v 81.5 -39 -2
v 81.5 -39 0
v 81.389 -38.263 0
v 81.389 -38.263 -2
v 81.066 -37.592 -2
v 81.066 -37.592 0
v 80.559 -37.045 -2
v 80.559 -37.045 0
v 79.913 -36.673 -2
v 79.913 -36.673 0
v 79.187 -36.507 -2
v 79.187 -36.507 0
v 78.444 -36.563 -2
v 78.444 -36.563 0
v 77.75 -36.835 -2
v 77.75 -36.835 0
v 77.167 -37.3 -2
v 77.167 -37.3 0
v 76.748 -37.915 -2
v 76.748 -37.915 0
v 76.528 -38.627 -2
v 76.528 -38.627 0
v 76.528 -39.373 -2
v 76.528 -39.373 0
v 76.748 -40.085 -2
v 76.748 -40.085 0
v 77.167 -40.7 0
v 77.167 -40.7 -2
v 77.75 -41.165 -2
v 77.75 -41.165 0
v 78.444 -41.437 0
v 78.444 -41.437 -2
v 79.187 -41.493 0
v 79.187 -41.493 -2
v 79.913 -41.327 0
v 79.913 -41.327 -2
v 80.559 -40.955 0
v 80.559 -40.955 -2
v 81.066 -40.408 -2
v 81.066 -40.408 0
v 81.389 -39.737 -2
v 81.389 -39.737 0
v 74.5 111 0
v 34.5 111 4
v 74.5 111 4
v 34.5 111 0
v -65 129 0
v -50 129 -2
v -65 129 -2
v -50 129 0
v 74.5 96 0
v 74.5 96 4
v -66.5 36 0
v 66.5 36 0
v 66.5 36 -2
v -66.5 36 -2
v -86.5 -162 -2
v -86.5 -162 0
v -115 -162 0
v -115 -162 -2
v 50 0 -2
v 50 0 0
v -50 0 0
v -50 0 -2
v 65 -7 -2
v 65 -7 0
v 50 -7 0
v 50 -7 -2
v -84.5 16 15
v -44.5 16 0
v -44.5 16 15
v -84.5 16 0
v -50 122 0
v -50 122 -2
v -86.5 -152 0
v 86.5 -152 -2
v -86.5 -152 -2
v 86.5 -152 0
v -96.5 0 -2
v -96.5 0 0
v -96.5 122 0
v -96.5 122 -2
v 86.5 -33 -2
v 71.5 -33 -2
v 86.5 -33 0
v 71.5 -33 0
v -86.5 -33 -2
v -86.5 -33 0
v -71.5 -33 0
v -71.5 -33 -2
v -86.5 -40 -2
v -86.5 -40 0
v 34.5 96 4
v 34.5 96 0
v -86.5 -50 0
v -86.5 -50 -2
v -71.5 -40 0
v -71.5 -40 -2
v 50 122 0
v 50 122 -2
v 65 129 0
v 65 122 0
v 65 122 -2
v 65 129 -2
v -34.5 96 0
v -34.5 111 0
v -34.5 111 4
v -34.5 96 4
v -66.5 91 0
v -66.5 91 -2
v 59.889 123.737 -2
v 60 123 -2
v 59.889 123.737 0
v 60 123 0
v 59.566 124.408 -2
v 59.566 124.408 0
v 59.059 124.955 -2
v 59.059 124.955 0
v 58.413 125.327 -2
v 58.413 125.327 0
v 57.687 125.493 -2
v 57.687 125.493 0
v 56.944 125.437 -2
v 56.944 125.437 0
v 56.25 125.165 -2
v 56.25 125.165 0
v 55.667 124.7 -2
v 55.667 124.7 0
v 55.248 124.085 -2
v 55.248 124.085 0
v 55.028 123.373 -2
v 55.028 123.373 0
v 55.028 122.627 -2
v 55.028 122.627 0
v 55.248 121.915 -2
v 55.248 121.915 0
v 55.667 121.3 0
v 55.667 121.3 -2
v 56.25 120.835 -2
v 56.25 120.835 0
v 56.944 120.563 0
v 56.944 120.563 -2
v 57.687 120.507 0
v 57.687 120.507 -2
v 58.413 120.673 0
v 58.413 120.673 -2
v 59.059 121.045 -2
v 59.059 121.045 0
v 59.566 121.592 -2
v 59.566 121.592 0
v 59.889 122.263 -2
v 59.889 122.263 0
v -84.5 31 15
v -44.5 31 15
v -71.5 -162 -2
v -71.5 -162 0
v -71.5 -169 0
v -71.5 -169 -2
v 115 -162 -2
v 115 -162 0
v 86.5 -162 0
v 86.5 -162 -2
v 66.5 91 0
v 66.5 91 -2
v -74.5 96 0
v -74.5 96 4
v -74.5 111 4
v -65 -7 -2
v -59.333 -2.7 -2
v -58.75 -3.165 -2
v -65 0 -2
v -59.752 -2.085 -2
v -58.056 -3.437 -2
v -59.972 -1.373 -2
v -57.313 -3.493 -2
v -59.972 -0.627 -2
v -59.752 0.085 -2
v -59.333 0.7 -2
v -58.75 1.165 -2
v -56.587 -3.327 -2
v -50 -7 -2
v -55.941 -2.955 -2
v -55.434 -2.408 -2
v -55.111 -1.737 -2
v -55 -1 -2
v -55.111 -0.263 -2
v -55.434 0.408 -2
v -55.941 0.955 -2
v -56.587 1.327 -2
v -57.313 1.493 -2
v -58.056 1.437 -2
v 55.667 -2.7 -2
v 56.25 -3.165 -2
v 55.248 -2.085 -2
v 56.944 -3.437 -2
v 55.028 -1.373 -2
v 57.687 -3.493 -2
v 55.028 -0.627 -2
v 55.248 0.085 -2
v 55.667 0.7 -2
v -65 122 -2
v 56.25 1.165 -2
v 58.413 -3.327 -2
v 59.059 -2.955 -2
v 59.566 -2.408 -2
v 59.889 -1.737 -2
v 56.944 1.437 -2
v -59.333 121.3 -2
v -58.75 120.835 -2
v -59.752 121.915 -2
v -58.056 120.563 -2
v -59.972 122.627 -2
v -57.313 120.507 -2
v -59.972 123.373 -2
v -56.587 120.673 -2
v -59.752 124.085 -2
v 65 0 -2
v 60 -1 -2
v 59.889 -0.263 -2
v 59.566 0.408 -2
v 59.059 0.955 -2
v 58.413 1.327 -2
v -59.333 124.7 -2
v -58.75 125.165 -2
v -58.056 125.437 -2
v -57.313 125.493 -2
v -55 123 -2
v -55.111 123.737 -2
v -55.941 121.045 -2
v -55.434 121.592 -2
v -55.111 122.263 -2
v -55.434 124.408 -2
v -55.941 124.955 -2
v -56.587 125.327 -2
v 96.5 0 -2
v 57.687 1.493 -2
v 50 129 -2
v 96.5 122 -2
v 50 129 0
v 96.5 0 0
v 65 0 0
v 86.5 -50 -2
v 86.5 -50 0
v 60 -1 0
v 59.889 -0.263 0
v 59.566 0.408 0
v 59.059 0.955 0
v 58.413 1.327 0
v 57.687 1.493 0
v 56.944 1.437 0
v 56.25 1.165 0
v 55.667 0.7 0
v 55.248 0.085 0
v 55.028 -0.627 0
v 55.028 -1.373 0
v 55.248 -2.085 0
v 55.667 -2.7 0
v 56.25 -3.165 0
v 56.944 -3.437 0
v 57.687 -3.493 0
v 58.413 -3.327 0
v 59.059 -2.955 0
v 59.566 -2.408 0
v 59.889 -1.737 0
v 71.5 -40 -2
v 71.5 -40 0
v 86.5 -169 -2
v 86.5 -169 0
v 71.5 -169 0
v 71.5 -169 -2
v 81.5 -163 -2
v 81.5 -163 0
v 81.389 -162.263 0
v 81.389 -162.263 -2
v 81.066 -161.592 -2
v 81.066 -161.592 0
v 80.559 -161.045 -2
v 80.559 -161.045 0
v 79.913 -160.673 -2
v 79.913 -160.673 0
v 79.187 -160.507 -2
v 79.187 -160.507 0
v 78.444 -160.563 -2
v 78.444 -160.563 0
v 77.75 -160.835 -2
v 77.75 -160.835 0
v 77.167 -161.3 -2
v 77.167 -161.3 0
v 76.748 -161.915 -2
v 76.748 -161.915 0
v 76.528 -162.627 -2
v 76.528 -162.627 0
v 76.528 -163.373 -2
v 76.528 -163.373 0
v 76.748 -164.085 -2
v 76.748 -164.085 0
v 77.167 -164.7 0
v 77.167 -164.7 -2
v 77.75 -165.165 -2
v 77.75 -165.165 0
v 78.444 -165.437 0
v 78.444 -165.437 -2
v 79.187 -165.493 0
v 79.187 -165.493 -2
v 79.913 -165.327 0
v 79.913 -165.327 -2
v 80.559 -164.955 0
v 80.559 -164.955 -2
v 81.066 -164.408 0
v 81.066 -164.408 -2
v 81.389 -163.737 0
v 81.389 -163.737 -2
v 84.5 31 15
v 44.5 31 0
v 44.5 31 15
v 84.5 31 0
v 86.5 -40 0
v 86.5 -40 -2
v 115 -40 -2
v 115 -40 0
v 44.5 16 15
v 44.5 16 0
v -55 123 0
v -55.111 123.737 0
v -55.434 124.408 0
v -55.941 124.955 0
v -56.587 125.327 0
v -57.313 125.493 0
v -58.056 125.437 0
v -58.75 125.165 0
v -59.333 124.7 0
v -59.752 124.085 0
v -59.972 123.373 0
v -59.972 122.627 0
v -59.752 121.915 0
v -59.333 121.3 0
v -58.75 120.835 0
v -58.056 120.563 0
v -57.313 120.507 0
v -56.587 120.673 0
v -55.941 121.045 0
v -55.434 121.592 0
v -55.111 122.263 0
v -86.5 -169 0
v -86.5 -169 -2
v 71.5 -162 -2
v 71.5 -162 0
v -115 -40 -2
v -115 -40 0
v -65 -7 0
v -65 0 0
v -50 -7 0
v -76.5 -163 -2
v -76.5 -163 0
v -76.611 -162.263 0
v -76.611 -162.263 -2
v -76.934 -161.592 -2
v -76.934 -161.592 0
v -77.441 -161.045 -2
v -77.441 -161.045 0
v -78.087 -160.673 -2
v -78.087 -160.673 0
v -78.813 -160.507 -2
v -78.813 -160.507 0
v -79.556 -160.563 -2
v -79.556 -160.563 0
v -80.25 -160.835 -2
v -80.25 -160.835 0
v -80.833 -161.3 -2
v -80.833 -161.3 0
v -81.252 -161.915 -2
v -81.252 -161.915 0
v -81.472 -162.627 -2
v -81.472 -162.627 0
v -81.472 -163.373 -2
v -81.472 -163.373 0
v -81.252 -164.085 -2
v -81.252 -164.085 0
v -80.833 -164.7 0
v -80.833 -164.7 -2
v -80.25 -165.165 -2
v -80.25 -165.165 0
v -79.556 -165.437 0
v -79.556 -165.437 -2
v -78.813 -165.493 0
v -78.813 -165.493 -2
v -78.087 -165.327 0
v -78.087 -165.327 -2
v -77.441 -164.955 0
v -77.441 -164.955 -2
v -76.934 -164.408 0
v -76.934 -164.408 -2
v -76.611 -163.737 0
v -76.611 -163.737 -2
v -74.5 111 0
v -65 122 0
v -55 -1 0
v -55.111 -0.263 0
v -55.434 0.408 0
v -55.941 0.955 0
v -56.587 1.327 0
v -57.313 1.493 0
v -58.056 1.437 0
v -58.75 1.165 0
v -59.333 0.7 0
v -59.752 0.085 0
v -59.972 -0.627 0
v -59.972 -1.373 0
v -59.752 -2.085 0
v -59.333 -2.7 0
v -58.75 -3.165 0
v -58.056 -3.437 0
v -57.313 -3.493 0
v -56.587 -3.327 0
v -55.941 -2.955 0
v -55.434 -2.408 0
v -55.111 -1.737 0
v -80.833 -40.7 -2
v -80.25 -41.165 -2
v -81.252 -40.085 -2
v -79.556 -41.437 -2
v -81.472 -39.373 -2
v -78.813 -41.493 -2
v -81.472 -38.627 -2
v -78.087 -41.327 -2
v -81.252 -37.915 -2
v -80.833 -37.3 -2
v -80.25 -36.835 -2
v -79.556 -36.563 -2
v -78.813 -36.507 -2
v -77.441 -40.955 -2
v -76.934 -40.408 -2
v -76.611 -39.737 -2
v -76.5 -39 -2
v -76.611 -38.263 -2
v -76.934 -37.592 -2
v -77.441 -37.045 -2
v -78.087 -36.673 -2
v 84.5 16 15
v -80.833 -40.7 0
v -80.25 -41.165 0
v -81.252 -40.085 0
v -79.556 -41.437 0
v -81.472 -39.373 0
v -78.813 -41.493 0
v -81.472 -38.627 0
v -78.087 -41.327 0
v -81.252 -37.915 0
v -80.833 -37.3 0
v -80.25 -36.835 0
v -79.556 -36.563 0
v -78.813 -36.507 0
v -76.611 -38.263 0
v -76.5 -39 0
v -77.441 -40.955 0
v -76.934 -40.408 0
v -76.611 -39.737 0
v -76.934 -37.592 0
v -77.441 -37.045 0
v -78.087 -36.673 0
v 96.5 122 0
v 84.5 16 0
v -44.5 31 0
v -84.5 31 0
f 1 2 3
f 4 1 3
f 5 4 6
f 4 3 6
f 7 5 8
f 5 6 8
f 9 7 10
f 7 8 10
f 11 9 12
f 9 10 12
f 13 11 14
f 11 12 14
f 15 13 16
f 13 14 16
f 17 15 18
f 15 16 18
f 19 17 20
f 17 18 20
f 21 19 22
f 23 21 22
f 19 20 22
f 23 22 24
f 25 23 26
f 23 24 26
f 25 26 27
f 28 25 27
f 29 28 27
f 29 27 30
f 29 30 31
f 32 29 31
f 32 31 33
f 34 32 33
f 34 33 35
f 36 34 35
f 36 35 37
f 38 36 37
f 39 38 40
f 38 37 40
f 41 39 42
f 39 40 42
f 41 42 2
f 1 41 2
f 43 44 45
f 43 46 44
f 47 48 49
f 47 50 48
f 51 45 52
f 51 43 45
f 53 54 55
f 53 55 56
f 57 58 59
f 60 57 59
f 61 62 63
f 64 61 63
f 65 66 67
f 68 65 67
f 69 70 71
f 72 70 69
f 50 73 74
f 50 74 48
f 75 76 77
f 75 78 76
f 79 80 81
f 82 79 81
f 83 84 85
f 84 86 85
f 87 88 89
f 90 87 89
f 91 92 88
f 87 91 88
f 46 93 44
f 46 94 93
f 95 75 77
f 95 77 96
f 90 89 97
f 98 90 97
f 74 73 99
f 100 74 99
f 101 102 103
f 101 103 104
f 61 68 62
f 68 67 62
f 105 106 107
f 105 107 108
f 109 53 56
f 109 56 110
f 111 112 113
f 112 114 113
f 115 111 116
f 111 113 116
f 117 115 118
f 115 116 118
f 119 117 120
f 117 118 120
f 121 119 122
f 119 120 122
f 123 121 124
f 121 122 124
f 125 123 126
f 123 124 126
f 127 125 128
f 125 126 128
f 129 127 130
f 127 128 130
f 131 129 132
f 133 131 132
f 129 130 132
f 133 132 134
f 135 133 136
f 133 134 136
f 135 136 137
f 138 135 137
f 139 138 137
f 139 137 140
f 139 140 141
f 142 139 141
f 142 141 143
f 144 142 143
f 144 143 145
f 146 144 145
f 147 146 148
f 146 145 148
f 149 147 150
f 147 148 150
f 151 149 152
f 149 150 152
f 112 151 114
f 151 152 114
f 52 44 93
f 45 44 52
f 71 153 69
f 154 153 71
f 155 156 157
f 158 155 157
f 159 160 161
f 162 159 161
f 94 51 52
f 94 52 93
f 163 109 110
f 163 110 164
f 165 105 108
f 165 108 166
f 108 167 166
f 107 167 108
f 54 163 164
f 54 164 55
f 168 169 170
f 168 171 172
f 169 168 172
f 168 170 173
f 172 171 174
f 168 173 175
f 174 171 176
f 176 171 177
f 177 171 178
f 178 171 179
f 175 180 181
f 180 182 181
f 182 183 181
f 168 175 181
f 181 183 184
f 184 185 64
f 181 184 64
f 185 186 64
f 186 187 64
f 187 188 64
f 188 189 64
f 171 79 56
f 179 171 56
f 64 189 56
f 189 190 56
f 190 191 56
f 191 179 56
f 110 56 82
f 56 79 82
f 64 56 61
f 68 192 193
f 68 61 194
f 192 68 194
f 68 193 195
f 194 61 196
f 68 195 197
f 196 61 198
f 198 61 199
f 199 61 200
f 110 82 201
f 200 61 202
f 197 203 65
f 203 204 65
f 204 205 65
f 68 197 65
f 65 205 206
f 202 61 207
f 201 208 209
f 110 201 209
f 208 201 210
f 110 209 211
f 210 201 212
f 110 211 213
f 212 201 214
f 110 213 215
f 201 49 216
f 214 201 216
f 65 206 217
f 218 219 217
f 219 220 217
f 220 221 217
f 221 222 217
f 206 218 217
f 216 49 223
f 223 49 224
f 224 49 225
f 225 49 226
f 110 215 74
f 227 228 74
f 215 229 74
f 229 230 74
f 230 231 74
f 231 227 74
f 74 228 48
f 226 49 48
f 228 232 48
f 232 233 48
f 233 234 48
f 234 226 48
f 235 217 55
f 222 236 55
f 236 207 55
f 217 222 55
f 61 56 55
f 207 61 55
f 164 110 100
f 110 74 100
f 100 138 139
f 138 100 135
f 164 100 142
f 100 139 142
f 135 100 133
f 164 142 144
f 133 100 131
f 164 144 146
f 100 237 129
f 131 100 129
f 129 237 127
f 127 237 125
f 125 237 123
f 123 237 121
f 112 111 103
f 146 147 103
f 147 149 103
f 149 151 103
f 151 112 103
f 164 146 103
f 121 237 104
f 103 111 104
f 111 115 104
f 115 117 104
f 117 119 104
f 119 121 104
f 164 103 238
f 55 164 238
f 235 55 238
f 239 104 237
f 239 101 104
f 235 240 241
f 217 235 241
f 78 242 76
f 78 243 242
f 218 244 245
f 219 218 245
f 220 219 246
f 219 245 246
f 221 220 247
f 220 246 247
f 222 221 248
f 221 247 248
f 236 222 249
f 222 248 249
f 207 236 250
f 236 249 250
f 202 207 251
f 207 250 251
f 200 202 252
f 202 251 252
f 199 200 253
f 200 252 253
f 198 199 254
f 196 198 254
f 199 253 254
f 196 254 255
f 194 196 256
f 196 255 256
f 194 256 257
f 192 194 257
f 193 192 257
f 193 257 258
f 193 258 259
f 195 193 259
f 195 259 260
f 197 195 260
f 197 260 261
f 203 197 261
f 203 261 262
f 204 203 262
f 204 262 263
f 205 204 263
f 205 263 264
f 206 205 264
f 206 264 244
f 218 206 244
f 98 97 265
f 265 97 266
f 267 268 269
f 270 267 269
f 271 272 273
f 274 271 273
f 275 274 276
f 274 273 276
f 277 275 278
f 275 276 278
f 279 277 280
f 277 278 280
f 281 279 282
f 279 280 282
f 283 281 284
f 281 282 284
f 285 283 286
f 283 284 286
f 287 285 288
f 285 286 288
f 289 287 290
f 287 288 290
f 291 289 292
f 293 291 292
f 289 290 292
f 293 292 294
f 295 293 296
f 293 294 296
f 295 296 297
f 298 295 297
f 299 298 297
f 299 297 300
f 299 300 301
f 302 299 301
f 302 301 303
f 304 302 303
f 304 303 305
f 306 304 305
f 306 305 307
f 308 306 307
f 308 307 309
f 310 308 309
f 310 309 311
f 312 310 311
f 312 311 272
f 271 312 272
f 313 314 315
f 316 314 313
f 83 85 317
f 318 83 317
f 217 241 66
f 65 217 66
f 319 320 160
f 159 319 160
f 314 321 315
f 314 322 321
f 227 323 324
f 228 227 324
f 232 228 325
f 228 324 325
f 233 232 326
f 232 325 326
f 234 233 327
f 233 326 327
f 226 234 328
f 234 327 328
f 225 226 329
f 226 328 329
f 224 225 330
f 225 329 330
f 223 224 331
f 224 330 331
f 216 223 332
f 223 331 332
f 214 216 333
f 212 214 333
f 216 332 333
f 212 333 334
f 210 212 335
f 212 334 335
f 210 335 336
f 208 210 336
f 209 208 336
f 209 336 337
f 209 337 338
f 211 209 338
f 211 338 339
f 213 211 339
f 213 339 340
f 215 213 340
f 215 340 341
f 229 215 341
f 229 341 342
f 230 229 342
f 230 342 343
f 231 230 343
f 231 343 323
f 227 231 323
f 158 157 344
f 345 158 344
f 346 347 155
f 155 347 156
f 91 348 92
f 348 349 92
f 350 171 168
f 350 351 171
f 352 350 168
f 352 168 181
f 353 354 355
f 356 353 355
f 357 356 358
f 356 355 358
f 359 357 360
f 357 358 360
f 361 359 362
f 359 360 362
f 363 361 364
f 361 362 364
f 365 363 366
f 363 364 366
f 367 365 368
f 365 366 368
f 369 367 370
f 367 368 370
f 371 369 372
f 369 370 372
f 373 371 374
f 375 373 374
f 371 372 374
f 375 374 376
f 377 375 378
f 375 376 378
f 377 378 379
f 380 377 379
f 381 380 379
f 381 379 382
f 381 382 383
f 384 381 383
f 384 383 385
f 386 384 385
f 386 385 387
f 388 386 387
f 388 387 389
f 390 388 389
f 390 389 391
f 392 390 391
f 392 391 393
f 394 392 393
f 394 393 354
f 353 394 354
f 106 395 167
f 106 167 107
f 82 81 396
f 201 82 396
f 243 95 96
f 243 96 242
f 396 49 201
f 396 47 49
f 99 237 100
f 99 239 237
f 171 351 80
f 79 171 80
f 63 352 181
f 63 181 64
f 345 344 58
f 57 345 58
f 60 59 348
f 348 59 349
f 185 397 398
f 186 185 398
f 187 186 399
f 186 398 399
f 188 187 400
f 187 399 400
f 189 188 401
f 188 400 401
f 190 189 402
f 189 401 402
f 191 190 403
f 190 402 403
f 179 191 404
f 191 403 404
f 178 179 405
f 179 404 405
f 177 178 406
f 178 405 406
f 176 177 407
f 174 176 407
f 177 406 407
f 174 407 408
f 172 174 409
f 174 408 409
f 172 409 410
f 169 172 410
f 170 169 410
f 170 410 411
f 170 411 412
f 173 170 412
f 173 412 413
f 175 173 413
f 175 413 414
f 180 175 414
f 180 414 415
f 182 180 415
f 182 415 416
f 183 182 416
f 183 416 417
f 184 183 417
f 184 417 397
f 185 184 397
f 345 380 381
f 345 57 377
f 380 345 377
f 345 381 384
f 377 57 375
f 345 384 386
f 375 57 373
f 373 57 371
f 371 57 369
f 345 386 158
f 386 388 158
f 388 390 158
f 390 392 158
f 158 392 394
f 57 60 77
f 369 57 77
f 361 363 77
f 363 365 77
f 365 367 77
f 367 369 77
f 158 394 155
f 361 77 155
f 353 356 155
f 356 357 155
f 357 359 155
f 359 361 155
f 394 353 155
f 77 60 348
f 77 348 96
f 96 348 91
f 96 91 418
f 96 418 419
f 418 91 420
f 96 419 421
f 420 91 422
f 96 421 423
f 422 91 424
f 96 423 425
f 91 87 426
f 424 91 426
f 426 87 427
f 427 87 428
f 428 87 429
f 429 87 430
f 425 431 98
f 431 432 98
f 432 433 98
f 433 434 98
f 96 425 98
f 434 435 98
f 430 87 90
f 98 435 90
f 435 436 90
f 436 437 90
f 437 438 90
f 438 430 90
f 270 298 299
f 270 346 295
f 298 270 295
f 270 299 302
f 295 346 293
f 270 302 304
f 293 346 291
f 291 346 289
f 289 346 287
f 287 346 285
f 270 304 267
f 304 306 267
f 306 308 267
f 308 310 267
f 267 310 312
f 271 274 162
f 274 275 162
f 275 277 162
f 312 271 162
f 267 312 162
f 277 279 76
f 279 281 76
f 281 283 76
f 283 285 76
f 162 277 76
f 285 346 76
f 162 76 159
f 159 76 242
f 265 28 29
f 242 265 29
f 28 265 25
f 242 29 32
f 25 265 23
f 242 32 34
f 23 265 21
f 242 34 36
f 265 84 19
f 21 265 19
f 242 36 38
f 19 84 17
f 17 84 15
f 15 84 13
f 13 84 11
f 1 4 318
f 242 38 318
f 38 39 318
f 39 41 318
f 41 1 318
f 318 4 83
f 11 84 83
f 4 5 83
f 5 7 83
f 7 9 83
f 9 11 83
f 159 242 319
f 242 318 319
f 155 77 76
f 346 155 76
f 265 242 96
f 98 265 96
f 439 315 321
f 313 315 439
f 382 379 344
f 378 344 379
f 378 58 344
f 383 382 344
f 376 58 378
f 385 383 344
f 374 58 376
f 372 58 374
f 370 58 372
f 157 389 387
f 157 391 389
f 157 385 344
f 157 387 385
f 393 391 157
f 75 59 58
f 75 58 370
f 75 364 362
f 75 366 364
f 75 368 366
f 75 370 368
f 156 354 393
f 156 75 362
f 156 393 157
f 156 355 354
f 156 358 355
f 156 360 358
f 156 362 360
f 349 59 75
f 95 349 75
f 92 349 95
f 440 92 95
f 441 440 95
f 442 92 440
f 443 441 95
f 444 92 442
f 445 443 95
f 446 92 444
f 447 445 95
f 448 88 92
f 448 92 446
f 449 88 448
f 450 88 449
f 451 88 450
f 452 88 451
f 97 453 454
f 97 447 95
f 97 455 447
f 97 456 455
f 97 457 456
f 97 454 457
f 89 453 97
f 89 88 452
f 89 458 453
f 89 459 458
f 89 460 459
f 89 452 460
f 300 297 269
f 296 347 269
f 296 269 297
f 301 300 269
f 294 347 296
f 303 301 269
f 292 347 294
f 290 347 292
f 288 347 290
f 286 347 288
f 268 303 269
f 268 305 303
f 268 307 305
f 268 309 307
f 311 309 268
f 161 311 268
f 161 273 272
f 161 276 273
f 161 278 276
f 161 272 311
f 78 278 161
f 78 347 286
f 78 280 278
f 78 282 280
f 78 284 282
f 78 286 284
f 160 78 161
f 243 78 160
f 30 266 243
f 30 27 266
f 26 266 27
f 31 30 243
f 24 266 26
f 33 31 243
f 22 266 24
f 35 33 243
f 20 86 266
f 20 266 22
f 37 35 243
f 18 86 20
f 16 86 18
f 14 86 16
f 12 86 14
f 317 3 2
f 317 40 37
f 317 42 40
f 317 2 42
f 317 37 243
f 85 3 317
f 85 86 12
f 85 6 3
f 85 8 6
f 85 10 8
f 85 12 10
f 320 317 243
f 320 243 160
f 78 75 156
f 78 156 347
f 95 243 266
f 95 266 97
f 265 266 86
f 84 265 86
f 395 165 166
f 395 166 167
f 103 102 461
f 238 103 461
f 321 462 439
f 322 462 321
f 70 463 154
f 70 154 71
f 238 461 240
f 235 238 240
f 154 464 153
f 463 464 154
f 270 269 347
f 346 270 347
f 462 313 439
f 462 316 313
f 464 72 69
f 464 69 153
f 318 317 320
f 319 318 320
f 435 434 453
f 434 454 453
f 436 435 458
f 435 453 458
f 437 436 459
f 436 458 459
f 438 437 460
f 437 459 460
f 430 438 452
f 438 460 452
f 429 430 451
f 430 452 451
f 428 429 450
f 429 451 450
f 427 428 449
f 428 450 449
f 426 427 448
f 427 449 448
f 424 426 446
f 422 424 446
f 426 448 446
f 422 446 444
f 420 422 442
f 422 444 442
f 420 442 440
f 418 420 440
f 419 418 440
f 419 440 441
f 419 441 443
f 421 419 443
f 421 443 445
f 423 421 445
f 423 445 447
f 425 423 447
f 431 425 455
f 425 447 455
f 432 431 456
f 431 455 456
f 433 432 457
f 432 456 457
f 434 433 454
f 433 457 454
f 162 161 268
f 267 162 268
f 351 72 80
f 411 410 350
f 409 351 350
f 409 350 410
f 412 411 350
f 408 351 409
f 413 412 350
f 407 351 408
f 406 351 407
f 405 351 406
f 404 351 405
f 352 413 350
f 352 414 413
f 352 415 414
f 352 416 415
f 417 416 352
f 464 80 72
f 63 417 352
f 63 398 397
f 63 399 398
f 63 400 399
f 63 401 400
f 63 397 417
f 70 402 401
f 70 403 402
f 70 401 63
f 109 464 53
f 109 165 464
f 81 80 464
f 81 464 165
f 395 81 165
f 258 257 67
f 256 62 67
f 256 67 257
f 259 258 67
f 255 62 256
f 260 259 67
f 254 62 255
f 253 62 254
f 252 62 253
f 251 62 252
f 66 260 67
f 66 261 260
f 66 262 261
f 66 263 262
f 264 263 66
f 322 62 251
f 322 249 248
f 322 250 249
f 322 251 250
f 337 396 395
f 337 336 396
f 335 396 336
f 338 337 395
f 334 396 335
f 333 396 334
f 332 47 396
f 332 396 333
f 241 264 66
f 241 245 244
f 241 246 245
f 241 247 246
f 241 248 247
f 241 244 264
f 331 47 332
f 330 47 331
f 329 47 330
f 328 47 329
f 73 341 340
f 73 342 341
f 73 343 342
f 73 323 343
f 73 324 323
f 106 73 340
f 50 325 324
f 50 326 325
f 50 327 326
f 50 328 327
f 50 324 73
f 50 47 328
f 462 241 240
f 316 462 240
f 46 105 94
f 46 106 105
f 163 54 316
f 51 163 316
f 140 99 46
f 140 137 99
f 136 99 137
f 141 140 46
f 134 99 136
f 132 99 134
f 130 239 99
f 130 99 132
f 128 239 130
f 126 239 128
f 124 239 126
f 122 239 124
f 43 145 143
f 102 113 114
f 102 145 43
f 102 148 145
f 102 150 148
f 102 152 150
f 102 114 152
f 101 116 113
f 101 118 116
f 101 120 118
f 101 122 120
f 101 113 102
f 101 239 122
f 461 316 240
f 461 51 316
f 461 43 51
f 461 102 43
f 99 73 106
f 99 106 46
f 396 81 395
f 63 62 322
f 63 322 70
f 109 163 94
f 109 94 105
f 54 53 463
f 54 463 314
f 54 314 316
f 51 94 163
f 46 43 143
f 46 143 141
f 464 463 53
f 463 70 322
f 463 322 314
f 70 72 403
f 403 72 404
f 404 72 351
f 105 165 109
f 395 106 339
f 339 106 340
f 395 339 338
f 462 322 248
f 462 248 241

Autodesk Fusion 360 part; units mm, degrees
sketch "Sketch1" plane through (0, 0, 0) normal (0, 0, 1) x (1, 0, 0) in component "SD XL Back"
  line L0 (0, 0) -> (0, 5) construction
  line L1 (-91.5, 117) -> (91.5, 117)
  line L2 (91.5, 117) -> (91.5, 5)
  line L3 (91.5, 5) -> (-91.5, 5)
  line L4 (-91.5, 5) -> (-91.5, 117)
  line L5 (-74.5, 111) -> (-34.5, 111)
  line L6 (-34.5, 111) -> (-34.5, 96)
  line L7 (-34.5, 96) -> (-74.5, 96)
  line L8 (-74.5, 96) -> (-74.5, 111)
  line L9 (34.5, 111) -> (74.5, 111)
  line L10 (74.5, 111) -> (74.5, 96)
  line L11 (74.5, 96) -> (34.5, 96)
  line L12 (34.5, 96) -> (34.5, 111)
  line L13 (-84.5, 31) -> (-44.5, 31)
  line L14 (-44.5, 31) -> (-44.5, 16)
  line L15 (-44.5, 16) -> (-84.5, 16)
  line L16 (-84.5, 16) -> (-84.5, 31)
  line L17 (44.5, 31) -> (84.5, 31)
  line L18 (84.5, 31) -> (84.5, 16)
  line L19 (84.5, 16) -> (44.5, 16)
  line L20 (44.5, 16) -> (44.5, 31)
  line L21 (-66.5, 91) -> (66.5, 91)
  line L22 (66.5, 91) -> (66.5, 36)
  line L23 (66.5, 36) -> (-66.5, 36)
  line L24 (-66.5, 36) -> (-66.5, 91)
  line L25 (0, 117) -> (0, 91) construction
  line L26 (0, 5) -> (0, 36) construction
  line L27 (-96.5, 0) -> (-96.5, 122)
  line L28 (96.5, 122) -> (96.5, 0)
  line L29 (-65, 117) -> (-50, 117)
  line L30 (-50, 117) -> (-50, 129)
  line L31 (-50, 129) -> (-65, 129)
  line L32 (-65, 129) -> (-65, 117)
  line L33 (50, 117) -> (65, 117)
  line L34 (65, 117) -> (65, 129)
  line L35 (65, 129) -> (50, 129)
  line L36 (50, 129) -> (50, 117)
  line L37 (57.5, 129) -> (57.5, 117) construction
  line L38 (-57.5, 129) -> (-57.5, 117) construction
  circle A0 centre (57.5, 123) radius 2.5
  circle A1 centre (-57.5, 123) radius 2.5
  line L39 (-96.5, 122) -> (-65, 122)
  line L40 (-50, 122) -> (50, 122)
  line L41 (65, 122) -> (96.5, 122)
  line L42 (-50, 5) -> (-65, 5)
  line L43 (-65, 5) -> (-65, -7)
  line L44 (-65, -7) -> (-50, -7)
  line L45 (-50, -7) -> (-50, 5)
  line L46 (50, 5) -> (65, 5)
  line L47 (65, 5) -> (65, -7)
  line L48 (65, -7) -> (50, -7)
  line L49 (50, -7) -> (50, 5)
  line L50 (-57.5, 5) -> (-57.5, -7) construction
  line L51 (57.5, 5) -> (57.5, -7) construction
  circle A2 centre (-57.5, -1) radius 2.5
  circle A3 centre (57.5, -1) radius 2.5
  line L52 (-65, 0) -> (-96.5, 0)
  line L53 (96.5, 0) -> (65, 0)
  line L54 (50, 0) -> (-50, 0)
  dimension "d1" = 5
  dimension "d2" = 183
  dimension "d5" = 112
  dimension "d8" = 40
  dimension "d9" = 15
  dimension "d10" = 17
  dimension "d11" = 17
  dimension "d12" = 7
  dimension "d13" = 7
  dimension "d14" = 11
  dimension "d15" = 11
  dimension "d19" = 25
  dimension "d28" = 12
  dimension "d29" = 15
  dimension "d31" = 50
  dimension "d32" = 50
  dimension "d33" = 5
  dimension "d41" = 6
  dimension "d42" = 5
  dimension "d43" = 5
  dimension "d44" = 26
extrude "Extrude1" add sketch "Sketch1" against normal blind 2 contours L1 L3 L4 L27 L32 L39 L43 L52 | L1 L2 L3 L4 L29 L33 L42 L46 | L1 L29 L30 L31 L32 | L1 L30 L36 L40 | L3 L42 L43 L44 L45 | L1 L33 L34 L35 L36 | L3 L45 L49 L54 | L1 L2 L3 L28 L34 L41 L47 L53 | L3 L46 L47 L48 L49 | L5 L6 L7 L8 | L9 L10 L11 L12 | L13 L14 L15 L16 | L17 L18 L19 L20 makes body 1 in component "SD XL Back"
extrude "Extrude2" add sketch "Sketch1" along normal blind 4 contours L5 L6 L7 L8 | L9 L10 L11 L12 bodies 1 in component "SD XL Back"
extrude "Extrude3" add sketch "Sketch1" along normal blind 15 contours L13 L14 L15 L16 | L17 L18 L19 L20 bodies 1 in component "SD XL Back"
sketch "Sketch1 (2)" plane through (0, 0, 0) normal (0, 0, 1) x (1, 0, 0) in component "SD XL Front"
  line L0 (0, 0) -> (0, -50) construction
  line L1 (-86.5, -50) -> (86.5, -50)
  line L2 (86.5, -50) -> (86.5, -152)
  line L3 (86.5, -152) -> (-86.5, -152)
  line L4 (-86.5, -152) -> (-86.5, -50)
  line L5 (-115, -162) -> (-115, -40)
  line L6 (115, -40) -> (115, -162)
  line L7 (-86.5, -33) -> (-71.5, -33)
  line L8 (-71.5, -33) -> (-71.5, -45)
  line L9 (-71.5, -45) -> (-86.5, -45)
  line L10 (-86.5, -45) -> (-86.5, -33)
  line L11 (-50, 129) -> (-65, 129)
  line L12 (-65, 129) -> (-65, 117)
  line L13 (-79, -33) -> (-79, -45) construction
  circle A0 centre (-79, -39) radius 2.5
  circle A1 centre (-57.5, 123) radius 2.5 construction
  line L14 (-71.5, -40) -> (-71.5, -50) construction
  line L15 (71.5, -33) -> (86.5, -33)
  line L16 (86.5, -33) -> (86.5, -45)
  line L17 (86.5, -45) -> (71.5, -45)
  line L18 (71.5, -45) -> (71.5, -33)
  line L19 (79, -33) -> (79, -45) construction
  circle A2 centre (79, -39) radius 2.5
  line L20 (-71.5, -152) -> (-71.5, -162) construction
  line L21 (-86.5, -157) -> (-71.5, -157)
  line L22 (-71.5, -157) -> (-71.5, -169)
  line L23 (-71.5, -169) -> (-86.5, -169)
  line L24 (-86.5, -169) -> (-86.5, -157)
  line L25 (71.5, -157) -> (86.5, -157)
  line L26 (86.5, -157) -> (86.5, -169)
  line L27 (86.5, -169) -> (71.5, -169)
  line L28 (71.5, -169) -> (71.5, -157)
  line L29 (79, -157) -> (79, -169) construction
  line L30 (-79, -157) -> (-79, -169) construction
  circle A3 centre (79, -163) radius 2.5
  circle A4 centre (-79, -163) radius 2.5
  line L31 (-115, -40) -> (-86.5, -40)
  line L32 (-71.5, -40) -> (71.5, -40)
  line L33 (86.5, -40) -> (115, -40)
  line L34 (115, -162) -> (86.5, -162)
  line L35 (71.5, -162) -> (-71.5, -162)
  line L36 (-86.5, -162) -> (-115, -162)
  dimension "d34" = 50
  dimension "d35" = 173
  dimension "d37" = 102
  dimension "d45" = 230
extrude "Extrude1'" add sketch "Sketch1 (2)" against normal blind 2 separate body makes body 2 in component "SD XL Front"
component "SD XL Back" placed x (1, 0, 0) y (0, 1, 0) z (0, 0, 1) at (0, 0, 0)
component "SD XL Front" placed x (1, 0, 0) y (0, 1, 0) z (0, 0, 1) at (0, 0, 0)
equation "d2 = SD_XL_Width"
equation "SD_XL_Width = 183 mm"
equation "SD_XL_Height = 112 mm"
equation "d5 = SD_XL_Height"
equation "SD_XL_Top_Depth = 34 mm"
equation "SD_XL_Bottom_Depth = 23 mm"
equation "d11 = d10"
equation "d13 = d12"
equation "d15 = d14"
equation "d16 = 25 mm"
equation "d19 = d16"
equation "Frame_Depth = 38 mm"
equation "d23 = Frame_Depth - SD_XL_Top_Depth"
equation "d25 = Frame_Depth - SD_XL_Bottom_Depth"
equation "d32 = d31"
equation "d35 = SD_XL_Width - 10 mm"
equation "d37 = SD_XL_Height - 10 mm"
equation "d43 = d42"
